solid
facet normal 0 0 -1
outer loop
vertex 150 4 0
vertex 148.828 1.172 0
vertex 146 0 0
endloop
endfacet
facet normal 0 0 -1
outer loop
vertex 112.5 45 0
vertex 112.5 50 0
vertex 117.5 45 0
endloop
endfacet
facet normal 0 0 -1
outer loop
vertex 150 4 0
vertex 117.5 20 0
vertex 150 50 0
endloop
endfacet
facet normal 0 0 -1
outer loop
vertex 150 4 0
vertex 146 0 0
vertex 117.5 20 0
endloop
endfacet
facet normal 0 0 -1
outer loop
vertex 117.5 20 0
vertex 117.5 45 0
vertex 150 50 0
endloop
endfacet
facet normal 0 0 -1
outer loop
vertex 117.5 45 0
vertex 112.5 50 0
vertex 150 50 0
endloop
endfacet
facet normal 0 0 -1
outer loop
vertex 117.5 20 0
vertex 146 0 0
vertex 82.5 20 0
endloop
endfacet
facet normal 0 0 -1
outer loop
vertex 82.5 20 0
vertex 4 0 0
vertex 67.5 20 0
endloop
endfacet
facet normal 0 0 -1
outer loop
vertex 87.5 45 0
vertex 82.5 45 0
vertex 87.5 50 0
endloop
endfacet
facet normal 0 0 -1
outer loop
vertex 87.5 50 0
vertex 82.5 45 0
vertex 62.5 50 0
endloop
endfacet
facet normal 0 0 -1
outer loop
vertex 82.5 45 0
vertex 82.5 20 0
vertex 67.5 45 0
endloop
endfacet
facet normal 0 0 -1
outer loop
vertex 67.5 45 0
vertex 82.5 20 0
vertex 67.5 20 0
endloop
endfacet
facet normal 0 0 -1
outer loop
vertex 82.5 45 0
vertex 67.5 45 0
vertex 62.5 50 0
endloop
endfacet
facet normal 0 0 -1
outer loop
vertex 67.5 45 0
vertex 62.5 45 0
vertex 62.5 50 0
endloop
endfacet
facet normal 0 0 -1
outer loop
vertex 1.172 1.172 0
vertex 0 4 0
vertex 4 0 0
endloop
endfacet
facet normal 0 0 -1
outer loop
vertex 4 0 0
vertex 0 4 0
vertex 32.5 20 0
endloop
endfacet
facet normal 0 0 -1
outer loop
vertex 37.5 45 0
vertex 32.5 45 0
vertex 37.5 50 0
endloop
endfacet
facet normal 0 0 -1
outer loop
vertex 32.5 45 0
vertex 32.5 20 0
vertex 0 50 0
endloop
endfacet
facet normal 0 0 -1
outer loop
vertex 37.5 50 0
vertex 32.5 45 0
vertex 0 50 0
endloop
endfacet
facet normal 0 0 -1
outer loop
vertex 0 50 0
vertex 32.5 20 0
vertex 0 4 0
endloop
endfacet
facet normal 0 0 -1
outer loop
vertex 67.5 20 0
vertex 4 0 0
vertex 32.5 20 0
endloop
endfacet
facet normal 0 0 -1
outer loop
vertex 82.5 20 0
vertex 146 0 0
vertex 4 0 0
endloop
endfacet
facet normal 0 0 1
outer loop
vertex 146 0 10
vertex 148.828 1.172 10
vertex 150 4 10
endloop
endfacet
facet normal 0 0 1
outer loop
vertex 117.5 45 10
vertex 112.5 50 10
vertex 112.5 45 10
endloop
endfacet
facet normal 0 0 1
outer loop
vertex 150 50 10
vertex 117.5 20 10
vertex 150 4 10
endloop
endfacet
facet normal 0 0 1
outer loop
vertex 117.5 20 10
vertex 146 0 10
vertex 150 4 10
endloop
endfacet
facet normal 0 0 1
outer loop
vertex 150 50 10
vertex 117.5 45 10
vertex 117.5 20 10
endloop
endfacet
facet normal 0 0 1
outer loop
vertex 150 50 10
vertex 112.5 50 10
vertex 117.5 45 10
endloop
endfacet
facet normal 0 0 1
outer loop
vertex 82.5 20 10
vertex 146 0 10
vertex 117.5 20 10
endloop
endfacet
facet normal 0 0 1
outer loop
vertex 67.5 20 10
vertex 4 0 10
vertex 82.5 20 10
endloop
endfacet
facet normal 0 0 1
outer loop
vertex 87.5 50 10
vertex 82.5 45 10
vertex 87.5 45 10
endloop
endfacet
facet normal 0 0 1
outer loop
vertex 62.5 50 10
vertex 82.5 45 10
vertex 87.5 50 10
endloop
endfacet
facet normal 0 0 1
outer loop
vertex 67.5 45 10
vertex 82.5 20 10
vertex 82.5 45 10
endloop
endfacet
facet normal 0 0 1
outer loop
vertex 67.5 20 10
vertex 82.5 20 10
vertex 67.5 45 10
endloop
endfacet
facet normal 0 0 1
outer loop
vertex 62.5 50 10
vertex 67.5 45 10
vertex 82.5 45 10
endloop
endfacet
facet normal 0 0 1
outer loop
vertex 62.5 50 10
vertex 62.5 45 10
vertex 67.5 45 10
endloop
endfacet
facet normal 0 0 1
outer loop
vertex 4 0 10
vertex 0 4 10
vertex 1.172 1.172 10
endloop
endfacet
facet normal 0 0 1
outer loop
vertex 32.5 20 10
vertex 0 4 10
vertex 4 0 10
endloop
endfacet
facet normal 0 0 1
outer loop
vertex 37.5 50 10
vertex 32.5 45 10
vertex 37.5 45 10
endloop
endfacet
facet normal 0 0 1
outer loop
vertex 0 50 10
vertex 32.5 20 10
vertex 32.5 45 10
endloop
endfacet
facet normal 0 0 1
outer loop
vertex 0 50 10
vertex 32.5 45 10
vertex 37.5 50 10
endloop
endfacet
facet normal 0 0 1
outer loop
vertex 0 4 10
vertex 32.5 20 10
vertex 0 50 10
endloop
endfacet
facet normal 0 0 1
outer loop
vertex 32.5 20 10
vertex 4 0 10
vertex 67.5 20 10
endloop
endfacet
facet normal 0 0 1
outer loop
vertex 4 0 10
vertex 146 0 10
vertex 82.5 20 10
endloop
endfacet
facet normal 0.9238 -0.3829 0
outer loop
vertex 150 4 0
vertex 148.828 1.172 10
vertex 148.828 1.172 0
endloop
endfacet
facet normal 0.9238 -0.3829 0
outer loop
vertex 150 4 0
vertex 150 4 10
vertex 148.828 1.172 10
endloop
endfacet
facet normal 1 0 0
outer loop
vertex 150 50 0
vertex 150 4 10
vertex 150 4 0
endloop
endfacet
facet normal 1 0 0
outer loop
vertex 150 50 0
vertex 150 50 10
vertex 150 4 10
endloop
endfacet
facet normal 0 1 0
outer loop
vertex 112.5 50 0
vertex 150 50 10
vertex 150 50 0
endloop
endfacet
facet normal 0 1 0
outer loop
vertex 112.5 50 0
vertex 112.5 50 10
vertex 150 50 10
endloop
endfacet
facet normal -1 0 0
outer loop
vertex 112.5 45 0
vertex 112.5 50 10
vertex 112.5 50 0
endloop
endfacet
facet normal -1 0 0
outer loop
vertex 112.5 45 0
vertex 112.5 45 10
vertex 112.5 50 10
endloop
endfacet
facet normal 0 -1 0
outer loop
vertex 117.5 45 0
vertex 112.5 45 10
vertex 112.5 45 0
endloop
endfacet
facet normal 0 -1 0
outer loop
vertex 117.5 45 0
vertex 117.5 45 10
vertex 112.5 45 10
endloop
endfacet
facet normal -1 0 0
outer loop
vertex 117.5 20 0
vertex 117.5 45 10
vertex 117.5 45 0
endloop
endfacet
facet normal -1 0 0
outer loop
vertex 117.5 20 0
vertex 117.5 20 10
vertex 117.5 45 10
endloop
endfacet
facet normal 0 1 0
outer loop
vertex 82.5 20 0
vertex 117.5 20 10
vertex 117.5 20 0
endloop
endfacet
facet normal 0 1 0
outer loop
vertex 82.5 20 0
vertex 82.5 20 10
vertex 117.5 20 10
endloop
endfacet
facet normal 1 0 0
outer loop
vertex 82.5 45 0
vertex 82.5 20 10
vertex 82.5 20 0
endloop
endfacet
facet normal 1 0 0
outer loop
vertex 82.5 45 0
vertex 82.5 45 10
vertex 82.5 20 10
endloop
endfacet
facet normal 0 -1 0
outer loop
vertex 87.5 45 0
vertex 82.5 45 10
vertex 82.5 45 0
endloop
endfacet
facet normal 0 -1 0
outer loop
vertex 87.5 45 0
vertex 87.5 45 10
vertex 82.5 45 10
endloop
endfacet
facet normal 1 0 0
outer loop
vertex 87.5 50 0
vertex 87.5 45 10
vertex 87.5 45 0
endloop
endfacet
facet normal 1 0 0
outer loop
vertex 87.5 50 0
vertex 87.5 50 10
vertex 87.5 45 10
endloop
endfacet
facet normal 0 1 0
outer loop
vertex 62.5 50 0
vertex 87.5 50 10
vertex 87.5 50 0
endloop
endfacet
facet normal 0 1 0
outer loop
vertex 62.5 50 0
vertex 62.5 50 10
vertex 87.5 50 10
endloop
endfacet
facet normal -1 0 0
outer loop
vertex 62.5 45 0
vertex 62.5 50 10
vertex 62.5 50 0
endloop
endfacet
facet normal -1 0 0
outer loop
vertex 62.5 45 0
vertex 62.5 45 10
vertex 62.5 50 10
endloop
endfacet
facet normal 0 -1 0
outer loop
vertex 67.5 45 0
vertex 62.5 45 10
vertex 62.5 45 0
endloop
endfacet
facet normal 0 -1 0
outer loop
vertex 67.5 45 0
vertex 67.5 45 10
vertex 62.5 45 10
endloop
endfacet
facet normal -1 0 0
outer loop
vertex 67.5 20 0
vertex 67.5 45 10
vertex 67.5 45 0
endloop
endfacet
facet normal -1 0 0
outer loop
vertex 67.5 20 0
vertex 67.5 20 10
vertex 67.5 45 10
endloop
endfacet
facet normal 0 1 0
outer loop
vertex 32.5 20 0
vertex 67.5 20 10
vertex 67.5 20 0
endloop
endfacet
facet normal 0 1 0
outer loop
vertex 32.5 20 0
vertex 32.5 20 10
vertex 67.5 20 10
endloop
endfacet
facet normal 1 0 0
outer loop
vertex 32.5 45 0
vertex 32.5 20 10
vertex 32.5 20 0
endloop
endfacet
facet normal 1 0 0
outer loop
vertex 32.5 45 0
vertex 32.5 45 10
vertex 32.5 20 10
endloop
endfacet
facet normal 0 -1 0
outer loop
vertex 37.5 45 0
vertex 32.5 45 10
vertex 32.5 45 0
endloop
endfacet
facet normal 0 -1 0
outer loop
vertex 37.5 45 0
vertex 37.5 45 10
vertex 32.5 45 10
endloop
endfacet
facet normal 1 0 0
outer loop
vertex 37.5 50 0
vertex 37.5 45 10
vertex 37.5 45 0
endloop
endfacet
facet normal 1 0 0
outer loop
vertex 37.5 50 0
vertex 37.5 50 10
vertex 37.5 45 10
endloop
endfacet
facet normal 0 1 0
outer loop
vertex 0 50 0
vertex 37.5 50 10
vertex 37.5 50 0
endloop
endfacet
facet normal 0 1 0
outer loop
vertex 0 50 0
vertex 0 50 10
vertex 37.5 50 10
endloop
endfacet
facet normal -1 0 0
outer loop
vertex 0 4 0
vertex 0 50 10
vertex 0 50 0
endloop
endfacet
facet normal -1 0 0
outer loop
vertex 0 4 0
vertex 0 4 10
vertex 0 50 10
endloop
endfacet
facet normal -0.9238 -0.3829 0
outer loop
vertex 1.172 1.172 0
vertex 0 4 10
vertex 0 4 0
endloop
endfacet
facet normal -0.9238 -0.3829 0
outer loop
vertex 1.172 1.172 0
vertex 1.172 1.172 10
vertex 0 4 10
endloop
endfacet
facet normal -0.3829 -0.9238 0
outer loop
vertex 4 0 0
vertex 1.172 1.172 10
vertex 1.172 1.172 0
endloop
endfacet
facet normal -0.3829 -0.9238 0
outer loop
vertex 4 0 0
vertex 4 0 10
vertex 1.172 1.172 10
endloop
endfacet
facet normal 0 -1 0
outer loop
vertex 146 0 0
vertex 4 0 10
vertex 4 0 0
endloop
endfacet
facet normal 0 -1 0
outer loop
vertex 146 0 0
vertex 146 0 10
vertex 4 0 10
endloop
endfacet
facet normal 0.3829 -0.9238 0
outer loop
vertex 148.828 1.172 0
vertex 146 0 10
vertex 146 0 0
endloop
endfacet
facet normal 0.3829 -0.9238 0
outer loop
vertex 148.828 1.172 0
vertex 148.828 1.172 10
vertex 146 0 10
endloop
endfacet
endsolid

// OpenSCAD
$fn = 32;

// ----------------------------------------------------------------------
// Oversize slot bar: 150 mm bar with 2 oversize windows
// ----------------------------------------------------------------------

// --- parameters (mm) ---
profile_height = 10;      // extrusion height
profile_points = 24;      // points of the closed outline

profile = [[0, 4], [1.172, 1.172], [4, 0], [146, 0], [148.828, 1.172], [150, 4], [150, 50], [112.5, 50], [112.5, 45], [117.5, 45], [117.5, 20], [82.5, 20], [82.5, 45], [87.5, 45], [87.5, 50], [62.5, 50], [62.5, 45], [67.5, 45], [67.5, 20], [32.5, 20], [32.5, 45], [37.5, 45], [37.5, 50], [0, 50]];  // single closed polygon, 24 points, counter clockwise

// --- the one profile operation ---
linear_extrude(height = profile_height) polygon(points = profile);
